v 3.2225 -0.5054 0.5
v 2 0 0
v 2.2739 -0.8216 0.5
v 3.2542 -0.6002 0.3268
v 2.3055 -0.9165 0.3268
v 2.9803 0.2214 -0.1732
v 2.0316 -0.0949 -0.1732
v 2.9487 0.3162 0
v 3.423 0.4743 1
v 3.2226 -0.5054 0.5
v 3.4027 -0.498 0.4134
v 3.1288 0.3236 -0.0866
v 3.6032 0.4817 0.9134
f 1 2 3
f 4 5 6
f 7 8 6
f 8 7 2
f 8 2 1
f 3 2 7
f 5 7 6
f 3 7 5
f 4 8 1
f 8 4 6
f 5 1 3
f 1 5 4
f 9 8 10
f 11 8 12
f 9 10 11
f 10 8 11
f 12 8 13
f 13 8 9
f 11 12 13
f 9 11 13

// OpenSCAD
//  TODO complex polygons (ie, with holes in the center)
// TODO properly flip polygons when folding??? (solved?)
// TODO fold seperation stuff + bends around folds
// NOTE currently all polygons must be declared with the right hand rule

$folded=1;
// Useful for showing fold-edges on a 2D projection, also a non-zero amount is
// necessary for the polyhedrons to be considered valid
// $foldsep=0.1; 
// Nice way of only seperating when unfolded
$foldsep=$folded ? 0.00001 : 0.1; 

// We don't let the  user provide a fold object here because they have to
// define the edge anyways, and I wan't to make it easier for people to fold
// polygons with holes in them
function fold(plane_norm,edge,max_angle,poly) = 
	let (
		edge_vec=edge[1]-edge[0],
		edge_vec_u=edge_vec/norm(edge_vec),
		edge_perp=cross(edge_vec_u,plane_norm),
		angle=max_angle*$folded,
		fold_vec=cos(angle)*edge_perp+sin(angle)*plane_norm,
		poly2=[
			for (i=[0:len(poly)-1])
				let (p=poly[i],px=p[0],py=p[1])
					edge_vec_u*px+fold_vec*(py+$foldsep)+edge[0]
		],
		new_norm=cross(fold_vec,edge_vec_u)
	) [poly2,new_norm];

module fold_extrude(fold_obj,thick,poly,plane_norm) {
	poly=poly == undef ? fold_obj[0] : poly;
	plane_norm=plane_norm == undef ? fold_obj[1] : plane_norm;
	pointc=len(poly);
	inner_points=poly;	
	outer_points=[
		for (i=[0:pointc-1])
			poly[i]-plane_norm*thick
	];
	both=concat(inner_points,outer_points);
	polyhedron(points=both,faces=[
			[for (i=[0:pointc-1]) i],
			[for (i=[2*pointc-1:-1:pointc]) i],
			for (i=[0:pointc-1]) 
				let (next = i+1==pointc ? 0 : i+1)
				[
					i,
					i+pointc,
					next+pointc,
					next
				]
		]);
}

// This naming scheme is just a placeholder, plenty of other ways to do it
p_square=[
	[0,0],
	[1,0],
	[1,1],
	[0,1]
];

o_square=fold([0,0,1],[[2,0,0],[5,1,0]],30,p_square);
f_square=o_square[0];
n_square=o_square[1];

p_tri=[
	[0,0],
	[1,0],
	[0.5,1]
];

o_tri=fold(n_square,[f_square[2],f_square[1]],60,p_tri);
f_tri=o_tri[0];
n_tri=o_tri[1];

fold_extrude(o_square,0.2);
fold_extrude(o_tri,0.2);
